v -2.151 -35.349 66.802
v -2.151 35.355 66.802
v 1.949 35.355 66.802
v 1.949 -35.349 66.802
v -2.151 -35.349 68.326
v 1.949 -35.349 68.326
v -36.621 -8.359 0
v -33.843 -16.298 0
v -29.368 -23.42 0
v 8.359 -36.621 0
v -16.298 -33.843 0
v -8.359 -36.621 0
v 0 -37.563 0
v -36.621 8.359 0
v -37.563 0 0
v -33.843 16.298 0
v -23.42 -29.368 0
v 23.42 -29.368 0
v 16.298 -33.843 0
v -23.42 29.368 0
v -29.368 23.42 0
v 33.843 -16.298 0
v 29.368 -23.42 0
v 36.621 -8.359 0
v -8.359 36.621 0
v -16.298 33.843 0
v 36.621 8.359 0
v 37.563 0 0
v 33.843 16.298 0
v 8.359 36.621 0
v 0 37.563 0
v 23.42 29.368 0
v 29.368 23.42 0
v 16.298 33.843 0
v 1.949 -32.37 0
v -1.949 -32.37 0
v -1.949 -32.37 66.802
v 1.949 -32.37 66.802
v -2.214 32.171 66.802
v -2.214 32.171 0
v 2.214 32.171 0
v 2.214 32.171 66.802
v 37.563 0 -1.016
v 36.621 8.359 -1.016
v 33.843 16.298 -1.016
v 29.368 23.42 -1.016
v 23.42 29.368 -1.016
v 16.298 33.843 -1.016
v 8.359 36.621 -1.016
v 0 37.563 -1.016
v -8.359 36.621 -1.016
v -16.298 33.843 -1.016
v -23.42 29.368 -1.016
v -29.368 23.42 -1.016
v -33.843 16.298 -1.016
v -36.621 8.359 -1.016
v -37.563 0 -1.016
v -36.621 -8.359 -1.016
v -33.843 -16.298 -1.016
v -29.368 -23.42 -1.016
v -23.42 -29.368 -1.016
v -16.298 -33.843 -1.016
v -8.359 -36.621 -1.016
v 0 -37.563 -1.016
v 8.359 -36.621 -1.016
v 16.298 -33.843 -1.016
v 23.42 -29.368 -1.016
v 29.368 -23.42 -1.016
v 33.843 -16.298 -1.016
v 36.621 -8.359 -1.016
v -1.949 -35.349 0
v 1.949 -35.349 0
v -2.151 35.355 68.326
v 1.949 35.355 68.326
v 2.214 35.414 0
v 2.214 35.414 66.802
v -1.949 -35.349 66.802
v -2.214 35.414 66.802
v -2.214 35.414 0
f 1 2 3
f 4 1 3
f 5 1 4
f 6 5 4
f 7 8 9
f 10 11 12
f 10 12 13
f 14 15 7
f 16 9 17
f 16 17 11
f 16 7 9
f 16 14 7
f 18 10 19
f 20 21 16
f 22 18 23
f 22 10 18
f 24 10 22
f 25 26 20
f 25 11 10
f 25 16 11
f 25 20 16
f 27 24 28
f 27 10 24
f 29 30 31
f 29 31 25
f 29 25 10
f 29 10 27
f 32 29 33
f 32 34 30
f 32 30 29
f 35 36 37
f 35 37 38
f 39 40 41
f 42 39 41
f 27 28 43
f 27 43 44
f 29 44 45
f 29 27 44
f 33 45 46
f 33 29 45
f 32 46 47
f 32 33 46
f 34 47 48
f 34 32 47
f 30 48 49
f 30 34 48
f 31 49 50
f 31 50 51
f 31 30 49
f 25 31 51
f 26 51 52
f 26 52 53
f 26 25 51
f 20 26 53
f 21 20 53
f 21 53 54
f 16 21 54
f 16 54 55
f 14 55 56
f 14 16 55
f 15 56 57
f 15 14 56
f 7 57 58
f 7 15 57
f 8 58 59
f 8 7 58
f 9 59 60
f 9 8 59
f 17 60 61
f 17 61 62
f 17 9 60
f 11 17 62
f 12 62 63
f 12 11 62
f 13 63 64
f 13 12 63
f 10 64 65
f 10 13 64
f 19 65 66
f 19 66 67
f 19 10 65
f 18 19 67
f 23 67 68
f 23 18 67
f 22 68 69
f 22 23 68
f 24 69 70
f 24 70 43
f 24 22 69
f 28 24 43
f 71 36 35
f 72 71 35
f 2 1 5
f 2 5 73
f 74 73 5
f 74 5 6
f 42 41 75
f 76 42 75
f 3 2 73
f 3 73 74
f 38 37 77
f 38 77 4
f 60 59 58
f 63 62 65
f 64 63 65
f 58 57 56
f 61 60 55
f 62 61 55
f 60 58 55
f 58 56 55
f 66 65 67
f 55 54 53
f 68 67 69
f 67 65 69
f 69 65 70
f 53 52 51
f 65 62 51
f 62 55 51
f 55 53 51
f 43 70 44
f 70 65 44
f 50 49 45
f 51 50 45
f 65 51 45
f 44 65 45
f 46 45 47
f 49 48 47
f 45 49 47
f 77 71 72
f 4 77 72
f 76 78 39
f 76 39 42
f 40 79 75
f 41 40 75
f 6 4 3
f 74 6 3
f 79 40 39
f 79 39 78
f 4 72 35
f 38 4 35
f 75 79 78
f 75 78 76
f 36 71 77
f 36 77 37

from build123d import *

# Parameters (mm, degrees)
F1_W     = 3.897249233
F1_H     = 2.9796436429
F2_DEPTH = 66.802
F1_W_2   = 4.4288989156
F1_H_2   = 3.24241817
F3_W     = 4.099171143
F3_H     = 70.7048140466
F4_DEPTH = 1.524
F0_R     = 37.5629925572
F5_DEPTH = 1.016


# Not quite as in the source:
# - the program builds the solid bodies; features that only make, move or delete a surface that nothing else refers to are left out


with BuildPart() as f2:
    # F1 (on face) → F2 (new body)
    with BuildSketch(Plane.XY):
        with Locations((0, -33.859655261)):
            Rectangle(F1_W, F1_H)
    extrude(amount=F2_DEPTH)


with BuildPart() as f2b:
    # F1 (on face) → F2, piece 2 (new body)
    with BuildSketch(Plane.XY):
        with Locations((0, 33.7925106287)):
            Rectangle(F1_W_2, F1_H_2)
    extrude(amount=F2_DEPTH)


with BuildPart() as f4:
    # F3 (on face) → F4 (new body)
    with BuildSketch(Plane.XY.offset(66.802)):
        with Locations((-0.100960955, 0.0029299408)):
            Rectangle(F3_W, F3_H)
    extrude(amount=F4_DEPTH)


with BuildPart() as f5:
    # F0 (on Top) → F5 (new body)
    with BuildSketch(Plane.XY):
        Circle(F0_R)
    extrude(amount=-F5_DEPTH)


solid = Compound([f2.part, f2b.part, f4.part, f5.part])
